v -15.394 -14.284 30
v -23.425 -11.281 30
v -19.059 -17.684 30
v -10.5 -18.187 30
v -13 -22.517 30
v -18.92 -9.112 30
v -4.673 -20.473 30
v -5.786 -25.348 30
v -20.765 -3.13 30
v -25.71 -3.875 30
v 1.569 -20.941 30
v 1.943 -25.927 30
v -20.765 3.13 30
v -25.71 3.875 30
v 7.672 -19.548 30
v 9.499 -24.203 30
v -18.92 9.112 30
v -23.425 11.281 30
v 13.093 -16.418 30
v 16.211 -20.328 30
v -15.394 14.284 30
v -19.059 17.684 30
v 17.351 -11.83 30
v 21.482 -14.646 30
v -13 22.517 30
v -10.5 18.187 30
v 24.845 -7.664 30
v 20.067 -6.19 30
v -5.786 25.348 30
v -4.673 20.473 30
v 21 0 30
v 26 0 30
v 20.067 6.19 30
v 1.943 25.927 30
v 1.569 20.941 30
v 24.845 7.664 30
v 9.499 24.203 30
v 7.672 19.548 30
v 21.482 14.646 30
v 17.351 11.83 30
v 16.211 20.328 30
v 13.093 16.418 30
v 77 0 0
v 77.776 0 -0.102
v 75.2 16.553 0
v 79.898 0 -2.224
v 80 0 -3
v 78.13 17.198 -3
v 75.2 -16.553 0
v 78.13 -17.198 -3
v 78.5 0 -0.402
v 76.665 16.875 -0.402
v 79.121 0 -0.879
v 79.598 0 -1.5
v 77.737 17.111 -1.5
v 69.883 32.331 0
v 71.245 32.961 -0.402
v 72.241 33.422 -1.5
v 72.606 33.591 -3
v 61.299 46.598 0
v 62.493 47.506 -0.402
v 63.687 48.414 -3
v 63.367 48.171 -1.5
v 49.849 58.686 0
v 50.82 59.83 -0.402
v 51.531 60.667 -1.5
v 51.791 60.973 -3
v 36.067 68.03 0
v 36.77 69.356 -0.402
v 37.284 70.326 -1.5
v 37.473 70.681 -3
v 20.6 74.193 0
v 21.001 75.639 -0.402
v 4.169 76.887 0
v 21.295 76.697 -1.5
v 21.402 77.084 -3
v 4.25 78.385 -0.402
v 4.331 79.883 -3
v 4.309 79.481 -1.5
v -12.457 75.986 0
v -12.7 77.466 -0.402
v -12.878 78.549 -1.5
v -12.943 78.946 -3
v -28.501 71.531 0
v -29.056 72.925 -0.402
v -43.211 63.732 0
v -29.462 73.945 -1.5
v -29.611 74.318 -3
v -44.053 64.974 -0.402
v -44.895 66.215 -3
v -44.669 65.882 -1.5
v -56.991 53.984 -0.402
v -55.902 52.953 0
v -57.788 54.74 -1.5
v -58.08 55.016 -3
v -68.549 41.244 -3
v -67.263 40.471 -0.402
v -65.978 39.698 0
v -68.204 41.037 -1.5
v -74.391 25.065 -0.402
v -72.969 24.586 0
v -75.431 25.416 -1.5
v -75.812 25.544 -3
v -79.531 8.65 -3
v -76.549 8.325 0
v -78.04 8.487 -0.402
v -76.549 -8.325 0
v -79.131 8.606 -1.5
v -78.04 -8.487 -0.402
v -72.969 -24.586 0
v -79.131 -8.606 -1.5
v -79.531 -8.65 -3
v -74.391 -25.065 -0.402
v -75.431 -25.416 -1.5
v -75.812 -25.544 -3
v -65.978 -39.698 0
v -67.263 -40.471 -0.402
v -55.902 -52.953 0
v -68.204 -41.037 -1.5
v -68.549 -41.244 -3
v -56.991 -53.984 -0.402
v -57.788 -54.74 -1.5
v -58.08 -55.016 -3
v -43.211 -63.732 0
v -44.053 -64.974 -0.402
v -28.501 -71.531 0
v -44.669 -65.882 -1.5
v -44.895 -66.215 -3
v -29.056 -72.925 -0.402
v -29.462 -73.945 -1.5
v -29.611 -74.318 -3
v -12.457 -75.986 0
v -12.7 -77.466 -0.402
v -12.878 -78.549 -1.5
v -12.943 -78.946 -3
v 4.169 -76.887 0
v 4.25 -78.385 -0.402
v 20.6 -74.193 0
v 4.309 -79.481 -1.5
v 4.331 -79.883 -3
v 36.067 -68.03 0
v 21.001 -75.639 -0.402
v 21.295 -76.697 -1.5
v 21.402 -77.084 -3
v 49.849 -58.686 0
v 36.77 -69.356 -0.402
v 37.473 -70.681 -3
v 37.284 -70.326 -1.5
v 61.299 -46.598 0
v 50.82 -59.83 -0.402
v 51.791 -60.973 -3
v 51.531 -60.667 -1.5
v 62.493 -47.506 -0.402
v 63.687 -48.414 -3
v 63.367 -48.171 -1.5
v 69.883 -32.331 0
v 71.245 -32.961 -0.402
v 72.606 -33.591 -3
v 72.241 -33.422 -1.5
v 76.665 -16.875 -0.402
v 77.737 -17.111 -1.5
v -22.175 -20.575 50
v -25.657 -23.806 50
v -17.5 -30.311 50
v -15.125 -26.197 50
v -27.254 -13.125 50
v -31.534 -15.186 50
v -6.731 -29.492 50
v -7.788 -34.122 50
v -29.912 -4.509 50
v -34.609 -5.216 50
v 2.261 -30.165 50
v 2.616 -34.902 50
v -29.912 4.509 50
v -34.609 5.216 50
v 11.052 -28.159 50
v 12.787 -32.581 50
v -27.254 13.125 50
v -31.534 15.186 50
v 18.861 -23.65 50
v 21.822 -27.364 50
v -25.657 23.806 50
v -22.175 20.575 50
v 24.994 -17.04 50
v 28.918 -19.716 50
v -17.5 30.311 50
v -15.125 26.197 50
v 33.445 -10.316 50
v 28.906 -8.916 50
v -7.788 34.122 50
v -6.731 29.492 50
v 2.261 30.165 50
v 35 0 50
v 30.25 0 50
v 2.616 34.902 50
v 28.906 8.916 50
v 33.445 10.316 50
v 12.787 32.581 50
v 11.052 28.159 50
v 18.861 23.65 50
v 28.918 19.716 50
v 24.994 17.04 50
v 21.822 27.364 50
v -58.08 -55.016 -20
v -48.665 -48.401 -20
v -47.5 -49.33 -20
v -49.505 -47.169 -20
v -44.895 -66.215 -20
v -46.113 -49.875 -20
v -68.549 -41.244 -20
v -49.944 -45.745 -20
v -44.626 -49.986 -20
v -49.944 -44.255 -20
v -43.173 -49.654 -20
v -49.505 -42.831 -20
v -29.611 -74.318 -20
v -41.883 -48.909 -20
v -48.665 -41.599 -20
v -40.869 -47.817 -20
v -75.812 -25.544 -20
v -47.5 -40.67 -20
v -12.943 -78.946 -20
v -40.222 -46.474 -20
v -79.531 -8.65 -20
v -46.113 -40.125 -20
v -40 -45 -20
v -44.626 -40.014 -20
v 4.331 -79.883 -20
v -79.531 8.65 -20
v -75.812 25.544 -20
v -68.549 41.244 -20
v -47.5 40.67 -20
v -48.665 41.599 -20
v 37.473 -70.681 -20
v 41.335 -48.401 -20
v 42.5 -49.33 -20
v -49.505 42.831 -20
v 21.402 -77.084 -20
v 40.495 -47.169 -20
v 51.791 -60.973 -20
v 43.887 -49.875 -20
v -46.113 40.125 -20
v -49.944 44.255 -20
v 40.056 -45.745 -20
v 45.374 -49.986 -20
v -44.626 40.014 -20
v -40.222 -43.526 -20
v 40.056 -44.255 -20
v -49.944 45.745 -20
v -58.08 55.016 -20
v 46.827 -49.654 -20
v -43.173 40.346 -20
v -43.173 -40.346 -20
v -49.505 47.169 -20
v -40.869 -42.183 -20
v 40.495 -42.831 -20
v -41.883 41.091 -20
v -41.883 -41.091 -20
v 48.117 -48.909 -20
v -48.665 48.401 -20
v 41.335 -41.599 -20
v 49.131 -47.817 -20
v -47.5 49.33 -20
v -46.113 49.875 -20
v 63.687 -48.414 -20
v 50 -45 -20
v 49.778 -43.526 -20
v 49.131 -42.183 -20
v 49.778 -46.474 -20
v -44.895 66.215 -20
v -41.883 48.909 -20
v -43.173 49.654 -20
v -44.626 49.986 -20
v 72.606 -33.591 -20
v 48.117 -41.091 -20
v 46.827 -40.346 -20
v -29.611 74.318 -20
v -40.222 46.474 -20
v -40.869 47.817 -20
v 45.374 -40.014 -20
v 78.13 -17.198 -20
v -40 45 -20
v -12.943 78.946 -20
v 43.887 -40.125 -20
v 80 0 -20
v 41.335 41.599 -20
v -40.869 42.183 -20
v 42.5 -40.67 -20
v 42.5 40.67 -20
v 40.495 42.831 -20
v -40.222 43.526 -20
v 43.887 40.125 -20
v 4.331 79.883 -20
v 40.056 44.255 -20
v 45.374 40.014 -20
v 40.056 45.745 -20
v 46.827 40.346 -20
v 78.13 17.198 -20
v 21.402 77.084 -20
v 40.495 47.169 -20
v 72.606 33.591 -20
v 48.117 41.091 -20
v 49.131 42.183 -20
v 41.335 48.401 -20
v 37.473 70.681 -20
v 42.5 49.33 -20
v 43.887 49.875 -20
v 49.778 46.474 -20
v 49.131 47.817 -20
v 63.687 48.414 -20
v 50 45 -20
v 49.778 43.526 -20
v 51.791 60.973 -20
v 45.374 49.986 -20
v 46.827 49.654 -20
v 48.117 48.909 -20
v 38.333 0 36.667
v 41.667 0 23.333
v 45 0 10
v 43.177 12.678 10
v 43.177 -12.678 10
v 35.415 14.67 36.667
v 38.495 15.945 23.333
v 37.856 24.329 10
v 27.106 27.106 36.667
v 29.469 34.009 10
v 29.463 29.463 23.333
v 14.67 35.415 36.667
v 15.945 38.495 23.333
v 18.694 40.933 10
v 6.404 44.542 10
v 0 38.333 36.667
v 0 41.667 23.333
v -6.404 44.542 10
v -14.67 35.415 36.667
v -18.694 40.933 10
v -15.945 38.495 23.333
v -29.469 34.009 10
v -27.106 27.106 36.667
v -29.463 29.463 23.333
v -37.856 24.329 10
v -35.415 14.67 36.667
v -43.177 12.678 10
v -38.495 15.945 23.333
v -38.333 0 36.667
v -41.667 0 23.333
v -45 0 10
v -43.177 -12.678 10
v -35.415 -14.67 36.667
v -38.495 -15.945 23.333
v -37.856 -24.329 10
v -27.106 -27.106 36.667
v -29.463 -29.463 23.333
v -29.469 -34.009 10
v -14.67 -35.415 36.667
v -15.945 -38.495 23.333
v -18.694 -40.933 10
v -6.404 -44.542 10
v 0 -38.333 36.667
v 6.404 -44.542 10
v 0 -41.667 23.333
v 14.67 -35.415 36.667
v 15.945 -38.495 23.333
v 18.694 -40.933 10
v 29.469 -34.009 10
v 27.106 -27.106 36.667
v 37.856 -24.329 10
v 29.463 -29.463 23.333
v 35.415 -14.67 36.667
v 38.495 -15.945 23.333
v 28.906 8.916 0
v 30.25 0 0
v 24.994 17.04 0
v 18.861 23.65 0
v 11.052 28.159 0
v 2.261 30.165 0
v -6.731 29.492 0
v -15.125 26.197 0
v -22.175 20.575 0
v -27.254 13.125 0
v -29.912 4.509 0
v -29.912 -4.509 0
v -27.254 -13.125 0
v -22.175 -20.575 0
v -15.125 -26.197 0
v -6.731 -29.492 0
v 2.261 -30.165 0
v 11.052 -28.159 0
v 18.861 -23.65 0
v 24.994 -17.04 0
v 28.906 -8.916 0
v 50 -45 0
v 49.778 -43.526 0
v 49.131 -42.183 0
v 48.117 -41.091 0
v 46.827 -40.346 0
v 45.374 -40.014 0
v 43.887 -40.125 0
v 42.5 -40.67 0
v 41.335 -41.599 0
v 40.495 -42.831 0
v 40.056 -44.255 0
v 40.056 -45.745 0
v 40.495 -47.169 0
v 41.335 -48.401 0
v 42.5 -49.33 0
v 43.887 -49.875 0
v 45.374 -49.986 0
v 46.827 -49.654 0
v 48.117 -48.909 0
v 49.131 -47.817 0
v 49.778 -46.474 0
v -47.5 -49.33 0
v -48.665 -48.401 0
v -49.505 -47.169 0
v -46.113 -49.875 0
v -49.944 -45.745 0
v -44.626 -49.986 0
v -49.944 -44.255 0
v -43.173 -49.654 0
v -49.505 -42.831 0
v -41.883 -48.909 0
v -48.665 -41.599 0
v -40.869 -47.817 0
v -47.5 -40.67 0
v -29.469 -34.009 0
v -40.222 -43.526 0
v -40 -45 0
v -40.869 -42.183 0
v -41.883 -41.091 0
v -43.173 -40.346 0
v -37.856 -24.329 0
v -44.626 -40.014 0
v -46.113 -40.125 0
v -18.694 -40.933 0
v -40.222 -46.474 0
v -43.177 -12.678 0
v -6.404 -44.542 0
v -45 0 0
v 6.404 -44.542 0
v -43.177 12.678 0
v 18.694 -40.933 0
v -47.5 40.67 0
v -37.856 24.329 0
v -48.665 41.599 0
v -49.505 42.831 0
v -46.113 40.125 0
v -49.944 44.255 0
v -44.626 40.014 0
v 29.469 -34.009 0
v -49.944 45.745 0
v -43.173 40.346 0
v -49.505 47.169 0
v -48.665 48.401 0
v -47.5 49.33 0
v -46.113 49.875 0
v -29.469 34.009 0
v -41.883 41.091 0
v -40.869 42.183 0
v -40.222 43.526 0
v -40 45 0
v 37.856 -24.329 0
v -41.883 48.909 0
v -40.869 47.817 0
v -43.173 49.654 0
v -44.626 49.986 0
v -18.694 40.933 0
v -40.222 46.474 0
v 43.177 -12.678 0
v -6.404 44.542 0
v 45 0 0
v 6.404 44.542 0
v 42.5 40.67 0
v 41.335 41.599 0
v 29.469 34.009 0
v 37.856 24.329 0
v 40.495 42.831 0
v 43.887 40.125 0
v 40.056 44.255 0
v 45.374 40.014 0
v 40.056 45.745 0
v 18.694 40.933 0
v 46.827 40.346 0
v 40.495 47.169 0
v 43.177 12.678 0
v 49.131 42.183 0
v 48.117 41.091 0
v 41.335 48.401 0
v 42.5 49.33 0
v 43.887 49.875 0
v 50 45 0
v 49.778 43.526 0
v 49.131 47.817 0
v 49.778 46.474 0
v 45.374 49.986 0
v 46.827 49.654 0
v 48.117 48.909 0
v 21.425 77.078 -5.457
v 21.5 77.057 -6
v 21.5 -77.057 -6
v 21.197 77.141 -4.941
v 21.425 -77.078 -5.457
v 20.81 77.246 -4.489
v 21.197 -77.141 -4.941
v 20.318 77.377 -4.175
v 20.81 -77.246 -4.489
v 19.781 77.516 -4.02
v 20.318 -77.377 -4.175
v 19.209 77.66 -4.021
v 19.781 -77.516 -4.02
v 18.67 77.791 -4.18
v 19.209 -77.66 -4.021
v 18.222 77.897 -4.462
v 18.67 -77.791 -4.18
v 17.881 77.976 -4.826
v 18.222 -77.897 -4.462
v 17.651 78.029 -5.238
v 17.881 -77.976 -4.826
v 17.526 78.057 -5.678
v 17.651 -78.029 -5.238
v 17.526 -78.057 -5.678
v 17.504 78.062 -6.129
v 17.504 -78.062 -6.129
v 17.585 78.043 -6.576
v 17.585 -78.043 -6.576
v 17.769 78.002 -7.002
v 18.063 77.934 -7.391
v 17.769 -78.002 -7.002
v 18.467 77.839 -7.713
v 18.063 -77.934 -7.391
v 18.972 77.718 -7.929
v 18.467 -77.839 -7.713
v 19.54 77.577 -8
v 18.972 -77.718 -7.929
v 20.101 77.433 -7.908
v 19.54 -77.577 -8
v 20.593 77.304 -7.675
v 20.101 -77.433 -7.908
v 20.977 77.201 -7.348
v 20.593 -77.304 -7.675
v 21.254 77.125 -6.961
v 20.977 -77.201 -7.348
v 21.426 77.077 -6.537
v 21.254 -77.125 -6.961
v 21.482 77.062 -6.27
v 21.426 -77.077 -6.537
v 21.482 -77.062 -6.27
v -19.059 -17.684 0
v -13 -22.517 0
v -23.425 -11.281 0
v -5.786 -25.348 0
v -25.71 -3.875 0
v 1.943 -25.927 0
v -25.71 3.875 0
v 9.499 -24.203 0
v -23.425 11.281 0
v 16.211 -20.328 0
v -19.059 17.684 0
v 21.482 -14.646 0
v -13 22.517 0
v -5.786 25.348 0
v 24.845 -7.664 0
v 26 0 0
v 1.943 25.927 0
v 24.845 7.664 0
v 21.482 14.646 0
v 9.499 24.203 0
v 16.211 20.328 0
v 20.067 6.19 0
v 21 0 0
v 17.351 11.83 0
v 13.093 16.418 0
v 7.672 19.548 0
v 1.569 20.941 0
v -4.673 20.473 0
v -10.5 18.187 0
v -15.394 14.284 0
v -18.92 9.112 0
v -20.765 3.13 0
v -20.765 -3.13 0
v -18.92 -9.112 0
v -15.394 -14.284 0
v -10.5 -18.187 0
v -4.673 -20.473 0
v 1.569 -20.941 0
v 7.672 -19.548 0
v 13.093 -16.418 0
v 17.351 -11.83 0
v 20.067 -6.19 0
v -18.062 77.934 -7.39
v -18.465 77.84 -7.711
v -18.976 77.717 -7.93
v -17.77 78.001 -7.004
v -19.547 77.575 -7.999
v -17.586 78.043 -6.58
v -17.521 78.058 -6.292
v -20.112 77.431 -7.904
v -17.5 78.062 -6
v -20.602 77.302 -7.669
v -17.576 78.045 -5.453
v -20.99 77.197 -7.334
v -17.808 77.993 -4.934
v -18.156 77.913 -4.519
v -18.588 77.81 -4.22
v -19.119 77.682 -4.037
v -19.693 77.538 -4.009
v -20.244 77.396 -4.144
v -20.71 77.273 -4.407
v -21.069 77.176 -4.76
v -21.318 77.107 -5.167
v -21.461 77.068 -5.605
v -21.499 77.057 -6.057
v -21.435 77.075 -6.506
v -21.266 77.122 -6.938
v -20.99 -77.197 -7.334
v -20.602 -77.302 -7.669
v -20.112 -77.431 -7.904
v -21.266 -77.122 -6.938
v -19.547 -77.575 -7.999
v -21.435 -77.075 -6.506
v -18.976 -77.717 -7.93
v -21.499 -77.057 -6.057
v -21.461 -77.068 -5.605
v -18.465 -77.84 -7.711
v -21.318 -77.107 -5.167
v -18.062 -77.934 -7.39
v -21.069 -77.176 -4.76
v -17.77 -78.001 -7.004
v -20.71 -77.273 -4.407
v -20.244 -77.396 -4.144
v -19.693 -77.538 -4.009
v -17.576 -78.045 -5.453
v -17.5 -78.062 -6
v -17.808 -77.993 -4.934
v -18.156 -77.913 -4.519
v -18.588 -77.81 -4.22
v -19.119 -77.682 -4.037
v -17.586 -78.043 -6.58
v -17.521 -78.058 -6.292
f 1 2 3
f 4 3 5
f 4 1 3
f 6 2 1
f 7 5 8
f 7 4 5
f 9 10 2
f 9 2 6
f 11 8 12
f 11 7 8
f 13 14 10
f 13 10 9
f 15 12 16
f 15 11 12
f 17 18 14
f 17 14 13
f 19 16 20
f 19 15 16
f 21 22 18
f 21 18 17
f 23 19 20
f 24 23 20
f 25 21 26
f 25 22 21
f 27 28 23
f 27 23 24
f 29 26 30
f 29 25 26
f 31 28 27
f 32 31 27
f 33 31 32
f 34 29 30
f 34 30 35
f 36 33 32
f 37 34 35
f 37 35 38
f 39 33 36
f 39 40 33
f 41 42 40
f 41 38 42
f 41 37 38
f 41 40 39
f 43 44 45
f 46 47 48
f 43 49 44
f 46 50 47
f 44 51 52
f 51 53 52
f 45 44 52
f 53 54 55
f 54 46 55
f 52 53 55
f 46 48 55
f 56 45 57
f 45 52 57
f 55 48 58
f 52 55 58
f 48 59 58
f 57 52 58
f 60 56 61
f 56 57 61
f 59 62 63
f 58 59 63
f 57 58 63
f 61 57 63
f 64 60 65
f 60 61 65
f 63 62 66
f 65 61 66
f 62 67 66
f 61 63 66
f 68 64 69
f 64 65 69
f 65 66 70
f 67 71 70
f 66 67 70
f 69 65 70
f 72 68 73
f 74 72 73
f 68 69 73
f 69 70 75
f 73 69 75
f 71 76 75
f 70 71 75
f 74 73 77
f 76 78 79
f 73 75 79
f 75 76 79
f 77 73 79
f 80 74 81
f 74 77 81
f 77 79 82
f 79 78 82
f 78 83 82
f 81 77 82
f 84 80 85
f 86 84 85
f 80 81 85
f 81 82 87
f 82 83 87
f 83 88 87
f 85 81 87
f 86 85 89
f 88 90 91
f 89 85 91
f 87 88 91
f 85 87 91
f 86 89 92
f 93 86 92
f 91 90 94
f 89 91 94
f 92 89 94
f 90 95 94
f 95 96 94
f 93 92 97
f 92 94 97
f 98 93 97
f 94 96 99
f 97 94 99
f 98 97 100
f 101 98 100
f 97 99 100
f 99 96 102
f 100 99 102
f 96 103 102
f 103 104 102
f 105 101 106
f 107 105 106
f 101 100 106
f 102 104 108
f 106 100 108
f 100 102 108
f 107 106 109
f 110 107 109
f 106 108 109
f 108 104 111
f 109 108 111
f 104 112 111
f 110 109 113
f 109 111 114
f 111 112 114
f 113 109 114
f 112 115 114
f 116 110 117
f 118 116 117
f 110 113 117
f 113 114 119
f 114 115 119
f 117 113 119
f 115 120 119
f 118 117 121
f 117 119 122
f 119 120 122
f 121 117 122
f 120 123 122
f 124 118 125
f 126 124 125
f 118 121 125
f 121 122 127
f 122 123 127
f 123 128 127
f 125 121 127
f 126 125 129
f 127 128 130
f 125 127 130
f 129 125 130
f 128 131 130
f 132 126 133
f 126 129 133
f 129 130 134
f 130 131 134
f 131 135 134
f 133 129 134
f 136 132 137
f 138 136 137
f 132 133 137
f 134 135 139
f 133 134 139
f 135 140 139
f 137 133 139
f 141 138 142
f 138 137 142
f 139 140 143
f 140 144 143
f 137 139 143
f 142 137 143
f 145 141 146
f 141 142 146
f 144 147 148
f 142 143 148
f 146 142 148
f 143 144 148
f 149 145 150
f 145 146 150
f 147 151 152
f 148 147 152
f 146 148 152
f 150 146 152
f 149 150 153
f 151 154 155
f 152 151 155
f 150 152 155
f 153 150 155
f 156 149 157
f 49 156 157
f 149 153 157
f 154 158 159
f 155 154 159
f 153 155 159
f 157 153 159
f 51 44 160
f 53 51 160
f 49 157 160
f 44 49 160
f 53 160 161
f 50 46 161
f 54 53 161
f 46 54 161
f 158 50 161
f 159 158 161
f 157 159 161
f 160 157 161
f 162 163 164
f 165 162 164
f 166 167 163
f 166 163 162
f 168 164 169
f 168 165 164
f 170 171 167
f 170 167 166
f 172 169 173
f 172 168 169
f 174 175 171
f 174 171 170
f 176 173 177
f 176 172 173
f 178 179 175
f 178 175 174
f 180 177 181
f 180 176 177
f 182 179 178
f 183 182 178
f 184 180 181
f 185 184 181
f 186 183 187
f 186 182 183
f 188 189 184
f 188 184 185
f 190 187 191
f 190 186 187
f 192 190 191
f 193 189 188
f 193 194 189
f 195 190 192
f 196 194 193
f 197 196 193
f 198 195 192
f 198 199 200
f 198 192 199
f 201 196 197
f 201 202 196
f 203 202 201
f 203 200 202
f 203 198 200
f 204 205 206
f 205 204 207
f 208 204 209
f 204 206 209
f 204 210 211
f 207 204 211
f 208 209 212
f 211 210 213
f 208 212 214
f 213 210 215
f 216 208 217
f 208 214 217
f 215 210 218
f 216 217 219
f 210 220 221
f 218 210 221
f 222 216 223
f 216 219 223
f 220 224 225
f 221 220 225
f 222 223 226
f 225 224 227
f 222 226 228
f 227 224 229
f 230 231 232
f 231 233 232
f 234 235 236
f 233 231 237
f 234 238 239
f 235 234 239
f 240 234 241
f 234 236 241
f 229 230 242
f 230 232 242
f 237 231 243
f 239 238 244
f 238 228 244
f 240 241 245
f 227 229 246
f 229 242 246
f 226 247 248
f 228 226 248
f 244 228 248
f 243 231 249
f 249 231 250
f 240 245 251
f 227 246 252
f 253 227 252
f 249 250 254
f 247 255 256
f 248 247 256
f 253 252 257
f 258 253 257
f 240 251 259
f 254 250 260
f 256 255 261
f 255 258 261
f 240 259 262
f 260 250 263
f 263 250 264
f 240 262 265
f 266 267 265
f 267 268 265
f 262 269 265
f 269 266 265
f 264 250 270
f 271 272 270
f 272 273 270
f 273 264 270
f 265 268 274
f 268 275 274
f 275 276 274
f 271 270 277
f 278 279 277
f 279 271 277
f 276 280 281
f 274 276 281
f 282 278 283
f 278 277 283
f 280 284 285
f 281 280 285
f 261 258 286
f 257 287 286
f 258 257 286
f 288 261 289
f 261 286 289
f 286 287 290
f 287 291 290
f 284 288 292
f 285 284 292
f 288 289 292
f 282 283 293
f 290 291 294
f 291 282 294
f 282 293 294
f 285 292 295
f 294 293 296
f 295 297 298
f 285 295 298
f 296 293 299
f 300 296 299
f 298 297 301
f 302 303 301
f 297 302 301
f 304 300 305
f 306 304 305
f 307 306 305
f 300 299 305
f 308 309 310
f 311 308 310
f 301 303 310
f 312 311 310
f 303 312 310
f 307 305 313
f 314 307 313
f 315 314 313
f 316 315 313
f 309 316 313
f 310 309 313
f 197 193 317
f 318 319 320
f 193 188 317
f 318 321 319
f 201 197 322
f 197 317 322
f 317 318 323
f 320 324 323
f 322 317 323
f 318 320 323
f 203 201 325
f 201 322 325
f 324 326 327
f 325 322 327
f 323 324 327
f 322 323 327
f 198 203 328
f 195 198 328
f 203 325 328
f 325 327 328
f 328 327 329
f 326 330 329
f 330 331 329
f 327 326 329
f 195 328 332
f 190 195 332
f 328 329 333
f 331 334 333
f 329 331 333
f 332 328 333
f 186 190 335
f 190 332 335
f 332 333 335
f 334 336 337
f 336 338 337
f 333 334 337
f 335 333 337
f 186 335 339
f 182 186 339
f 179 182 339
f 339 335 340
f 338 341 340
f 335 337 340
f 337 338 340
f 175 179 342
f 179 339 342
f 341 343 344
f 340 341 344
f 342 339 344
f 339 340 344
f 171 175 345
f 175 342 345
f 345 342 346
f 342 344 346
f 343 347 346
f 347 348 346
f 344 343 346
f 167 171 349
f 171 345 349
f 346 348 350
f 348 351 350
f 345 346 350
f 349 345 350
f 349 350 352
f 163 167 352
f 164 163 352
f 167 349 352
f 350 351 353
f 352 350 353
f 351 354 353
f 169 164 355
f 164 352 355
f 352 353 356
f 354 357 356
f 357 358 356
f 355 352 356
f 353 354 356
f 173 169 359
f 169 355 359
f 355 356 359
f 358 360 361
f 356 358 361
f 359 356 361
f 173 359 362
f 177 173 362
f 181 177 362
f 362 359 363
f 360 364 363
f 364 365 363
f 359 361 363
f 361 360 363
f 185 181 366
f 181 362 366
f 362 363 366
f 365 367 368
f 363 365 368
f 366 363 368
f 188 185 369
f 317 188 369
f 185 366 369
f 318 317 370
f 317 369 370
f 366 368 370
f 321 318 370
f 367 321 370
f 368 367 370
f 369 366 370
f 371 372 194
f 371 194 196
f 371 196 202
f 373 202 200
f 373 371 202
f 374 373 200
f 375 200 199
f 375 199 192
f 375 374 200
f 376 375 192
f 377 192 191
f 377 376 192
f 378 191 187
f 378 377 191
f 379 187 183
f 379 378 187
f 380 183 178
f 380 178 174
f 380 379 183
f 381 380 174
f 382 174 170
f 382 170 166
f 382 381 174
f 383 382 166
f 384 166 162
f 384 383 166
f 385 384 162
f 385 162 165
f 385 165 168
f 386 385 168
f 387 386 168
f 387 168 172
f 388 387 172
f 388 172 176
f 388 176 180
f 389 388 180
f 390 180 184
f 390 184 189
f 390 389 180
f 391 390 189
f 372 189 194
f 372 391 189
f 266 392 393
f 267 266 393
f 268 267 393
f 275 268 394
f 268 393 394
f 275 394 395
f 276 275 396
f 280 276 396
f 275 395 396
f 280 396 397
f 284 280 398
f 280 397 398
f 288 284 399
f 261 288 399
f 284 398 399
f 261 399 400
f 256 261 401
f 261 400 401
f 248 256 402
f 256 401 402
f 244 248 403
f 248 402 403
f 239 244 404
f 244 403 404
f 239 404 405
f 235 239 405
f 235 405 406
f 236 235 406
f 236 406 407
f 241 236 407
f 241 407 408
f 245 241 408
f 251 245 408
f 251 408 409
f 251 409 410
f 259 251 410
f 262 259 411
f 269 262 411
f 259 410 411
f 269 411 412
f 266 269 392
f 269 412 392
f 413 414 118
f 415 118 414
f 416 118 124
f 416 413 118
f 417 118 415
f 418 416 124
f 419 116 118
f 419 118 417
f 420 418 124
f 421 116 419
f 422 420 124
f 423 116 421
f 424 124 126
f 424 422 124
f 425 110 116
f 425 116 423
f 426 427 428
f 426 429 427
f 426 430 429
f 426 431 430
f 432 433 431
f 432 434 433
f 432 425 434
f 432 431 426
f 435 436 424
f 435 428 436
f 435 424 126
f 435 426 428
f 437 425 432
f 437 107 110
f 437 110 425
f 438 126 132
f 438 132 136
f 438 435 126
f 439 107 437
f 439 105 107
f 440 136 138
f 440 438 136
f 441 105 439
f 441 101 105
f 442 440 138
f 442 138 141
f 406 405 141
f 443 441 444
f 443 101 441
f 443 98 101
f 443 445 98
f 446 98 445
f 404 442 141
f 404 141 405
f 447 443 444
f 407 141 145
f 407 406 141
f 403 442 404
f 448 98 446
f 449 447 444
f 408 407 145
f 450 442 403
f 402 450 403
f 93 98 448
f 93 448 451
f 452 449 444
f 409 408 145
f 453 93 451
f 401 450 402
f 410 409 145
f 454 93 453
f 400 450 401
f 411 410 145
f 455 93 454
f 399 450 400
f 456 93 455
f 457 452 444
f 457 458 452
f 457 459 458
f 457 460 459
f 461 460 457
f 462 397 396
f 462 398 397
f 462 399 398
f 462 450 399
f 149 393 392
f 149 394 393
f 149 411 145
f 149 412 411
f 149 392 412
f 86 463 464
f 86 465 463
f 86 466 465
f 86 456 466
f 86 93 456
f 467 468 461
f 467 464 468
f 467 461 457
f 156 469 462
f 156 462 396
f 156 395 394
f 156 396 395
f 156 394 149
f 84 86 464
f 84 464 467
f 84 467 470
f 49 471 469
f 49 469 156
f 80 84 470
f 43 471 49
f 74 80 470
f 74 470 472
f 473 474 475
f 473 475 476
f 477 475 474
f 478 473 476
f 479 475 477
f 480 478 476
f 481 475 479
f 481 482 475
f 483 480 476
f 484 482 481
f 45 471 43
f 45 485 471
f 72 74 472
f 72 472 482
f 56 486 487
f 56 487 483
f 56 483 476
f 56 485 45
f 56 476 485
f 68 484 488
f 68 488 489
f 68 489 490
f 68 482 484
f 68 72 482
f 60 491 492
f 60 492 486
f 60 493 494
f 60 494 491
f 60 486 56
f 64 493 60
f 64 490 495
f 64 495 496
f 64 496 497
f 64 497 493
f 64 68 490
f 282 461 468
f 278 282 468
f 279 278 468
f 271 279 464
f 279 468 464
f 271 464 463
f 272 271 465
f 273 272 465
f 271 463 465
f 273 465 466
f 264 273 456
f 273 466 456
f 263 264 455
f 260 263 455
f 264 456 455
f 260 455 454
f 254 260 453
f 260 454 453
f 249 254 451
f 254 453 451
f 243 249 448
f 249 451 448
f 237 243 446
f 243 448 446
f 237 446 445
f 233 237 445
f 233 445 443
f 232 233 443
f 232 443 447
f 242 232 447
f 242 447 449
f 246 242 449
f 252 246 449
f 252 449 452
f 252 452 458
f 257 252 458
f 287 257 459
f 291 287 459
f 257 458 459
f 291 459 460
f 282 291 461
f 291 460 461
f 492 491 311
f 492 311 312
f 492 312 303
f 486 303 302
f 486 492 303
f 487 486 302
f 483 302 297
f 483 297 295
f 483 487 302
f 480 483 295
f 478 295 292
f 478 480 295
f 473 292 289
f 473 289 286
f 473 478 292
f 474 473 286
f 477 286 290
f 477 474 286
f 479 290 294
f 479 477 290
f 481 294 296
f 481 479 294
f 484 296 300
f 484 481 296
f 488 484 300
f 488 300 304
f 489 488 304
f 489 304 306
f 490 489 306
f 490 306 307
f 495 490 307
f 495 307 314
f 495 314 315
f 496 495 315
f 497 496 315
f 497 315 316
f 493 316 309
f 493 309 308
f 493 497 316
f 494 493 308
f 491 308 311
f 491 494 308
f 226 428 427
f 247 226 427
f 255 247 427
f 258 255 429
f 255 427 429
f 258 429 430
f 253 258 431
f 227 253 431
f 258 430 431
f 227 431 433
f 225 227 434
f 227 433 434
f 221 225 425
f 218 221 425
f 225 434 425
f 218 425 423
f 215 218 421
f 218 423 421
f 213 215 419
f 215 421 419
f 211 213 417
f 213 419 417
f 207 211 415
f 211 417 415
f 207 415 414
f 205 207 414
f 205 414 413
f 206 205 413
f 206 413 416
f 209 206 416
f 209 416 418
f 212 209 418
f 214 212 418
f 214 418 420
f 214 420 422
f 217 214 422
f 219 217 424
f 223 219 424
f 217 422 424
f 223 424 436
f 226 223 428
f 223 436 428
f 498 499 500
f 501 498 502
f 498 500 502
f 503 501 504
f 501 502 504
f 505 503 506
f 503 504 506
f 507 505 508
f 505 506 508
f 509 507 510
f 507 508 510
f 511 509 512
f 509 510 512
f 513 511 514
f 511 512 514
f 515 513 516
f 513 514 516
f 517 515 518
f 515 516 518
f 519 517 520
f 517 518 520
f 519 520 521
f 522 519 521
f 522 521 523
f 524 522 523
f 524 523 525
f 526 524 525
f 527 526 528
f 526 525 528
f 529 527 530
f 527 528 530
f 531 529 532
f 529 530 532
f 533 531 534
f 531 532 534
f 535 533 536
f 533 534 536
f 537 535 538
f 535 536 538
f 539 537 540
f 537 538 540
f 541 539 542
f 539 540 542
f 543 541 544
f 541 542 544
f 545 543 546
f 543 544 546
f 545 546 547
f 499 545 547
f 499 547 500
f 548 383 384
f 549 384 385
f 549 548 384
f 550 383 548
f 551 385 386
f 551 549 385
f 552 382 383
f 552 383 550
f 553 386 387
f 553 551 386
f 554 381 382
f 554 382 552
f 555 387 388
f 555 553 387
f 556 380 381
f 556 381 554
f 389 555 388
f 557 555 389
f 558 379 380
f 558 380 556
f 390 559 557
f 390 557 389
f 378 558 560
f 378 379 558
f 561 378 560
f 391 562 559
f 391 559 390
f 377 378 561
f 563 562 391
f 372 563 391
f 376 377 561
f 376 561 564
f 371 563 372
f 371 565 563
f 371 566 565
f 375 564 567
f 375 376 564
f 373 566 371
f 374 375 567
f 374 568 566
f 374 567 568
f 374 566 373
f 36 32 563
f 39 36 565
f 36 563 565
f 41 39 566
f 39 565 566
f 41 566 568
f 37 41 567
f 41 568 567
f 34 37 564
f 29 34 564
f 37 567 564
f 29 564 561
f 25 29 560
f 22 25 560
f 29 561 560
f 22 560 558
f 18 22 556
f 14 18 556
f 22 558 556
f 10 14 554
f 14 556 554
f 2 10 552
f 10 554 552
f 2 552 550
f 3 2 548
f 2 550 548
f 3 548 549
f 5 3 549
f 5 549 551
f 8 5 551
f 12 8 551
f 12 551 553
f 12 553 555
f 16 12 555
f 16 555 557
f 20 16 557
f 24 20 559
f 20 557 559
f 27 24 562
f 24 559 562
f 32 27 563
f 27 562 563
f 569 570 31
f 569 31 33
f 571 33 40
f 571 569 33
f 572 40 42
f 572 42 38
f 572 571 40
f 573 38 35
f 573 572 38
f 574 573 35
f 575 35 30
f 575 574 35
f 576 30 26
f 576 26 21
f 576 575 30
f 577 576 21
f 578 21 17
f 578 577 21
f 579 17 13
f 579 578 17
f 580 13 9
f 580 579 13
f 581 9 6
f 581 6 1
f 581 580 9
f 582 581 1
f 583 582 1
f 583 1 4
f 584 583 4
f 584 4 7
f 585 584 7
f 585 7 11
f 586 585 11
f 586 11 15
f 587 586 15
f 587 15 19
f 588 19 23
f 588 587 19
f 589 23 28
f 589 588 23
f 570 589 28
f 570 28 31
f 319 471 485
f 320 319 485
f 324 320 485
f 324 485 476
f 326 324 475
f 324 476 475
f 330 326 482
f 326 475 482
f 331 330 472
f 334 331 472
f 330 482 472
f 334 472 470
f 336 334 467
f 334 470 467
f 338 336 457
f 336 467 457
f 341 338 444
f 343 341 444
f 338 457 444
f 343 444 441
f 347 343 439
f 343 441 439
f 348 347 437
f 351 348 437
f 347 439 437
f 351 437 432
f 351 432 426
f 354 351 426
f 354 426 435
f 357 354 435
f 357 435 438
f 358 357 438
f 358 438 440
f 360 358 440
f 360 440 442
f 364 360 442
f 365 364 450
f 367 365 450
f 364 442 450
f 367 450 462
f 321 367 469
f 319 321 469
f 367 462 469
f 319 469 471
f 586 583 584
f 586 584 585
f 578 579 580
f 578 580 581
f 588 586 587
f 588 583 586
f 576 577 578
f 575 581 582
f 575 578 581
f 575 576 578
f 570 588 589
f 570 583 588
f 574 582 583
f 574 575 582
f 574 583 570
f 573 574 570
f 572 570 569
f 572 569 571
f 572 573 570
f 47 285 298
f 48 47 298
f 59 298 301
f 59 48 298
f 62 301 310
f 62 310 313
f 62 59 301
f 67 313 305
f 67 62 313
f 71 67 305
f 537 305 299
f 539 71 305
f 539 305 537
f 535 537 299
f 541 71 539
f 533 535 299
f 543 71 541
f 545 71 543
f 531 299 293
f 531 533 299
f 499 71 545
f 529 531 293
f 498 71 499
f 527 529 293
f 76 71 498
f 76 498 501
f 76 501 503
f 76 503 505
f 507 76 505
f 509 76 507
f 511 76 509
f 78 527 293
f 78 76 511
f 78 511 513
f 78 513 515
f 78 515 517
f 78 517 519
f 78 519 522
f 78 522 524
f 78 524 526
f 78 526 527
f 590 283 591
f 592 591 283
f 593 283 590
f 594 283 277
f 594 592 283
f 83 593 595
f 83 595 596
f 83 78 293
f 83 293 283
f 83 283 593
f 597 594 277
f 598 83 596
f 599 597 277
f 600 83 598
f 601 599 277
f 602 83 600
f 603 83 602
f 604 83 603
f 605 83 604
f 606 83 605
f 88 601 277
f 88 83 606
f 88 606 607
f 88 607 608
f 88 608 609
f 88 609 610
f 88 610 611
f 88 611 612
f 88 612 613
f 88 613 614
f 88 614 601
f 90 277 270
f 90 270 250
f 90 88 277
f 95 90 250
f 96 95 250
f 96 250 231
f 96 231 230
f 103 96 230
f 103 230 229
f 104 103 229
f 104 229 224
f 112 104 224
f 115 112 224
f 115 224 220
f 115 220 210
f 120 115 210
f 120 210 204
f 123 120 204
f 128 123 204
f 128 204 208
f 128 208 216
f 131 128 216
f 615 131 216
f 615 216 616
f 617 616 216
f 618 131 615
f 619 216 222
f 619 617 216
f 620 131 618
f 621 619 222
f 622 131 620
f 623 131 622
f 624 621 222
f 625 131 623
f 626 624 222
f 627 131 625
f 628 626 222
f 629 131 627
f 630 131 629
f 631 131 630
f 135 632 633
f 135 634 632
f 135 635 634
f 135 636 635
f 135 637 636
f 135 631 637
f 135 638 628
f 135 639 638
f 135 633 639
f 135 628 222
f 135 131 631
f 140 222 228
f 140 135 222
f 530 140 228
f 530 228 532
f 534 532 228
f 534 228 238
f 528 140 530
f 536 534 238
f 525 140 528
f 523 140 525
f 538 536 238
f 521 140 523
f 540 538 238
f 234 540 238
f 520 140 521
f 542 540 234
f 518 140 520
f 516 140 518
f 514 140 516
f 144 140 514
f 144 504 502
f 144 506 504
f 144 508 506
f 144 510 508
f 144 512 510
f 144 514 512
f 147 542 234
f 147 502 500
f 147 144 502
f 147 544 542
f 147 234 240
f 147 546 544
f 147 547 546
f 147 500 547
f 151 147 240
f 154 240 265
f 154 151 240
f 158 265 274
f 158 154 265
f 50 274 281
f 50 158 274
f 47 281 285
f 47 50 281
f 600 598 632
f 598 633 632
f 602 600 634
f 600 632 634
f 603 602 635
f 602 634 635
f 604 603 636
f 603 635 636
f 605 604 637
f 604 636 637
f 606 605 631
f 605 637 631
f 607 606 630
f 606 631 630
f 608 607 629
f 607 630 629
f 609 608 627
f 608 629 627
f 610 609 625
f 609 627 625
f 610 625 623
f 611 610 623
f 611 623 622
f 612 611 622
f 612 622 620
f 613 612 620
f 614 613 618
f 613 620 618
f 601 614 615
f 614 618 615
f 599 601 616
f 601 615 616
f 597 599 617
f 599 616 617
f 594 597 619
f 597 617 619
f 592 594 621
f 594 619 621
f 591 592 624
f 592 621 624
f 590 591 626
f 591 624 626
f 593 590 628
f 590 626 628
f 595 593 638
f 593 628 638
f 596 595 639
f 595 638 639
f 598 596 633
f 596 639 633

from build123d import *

# Parameters (mm, degrees)
F0_R     = 45
F0_R_2   = 30.25
F1_DEPTH = 50
F2_R     = 80
F2_R_2   = 5
F3_DEPTH = 20
F4_R     = 26
F4_R_2   = 21
F5_DEPTH = 30
F6_SIZE2 = 40
F6_SIZE  = 10
F7_R     = 2
F8_DEPTH = 85
F9_R     = 3


with BuildPart() as f1:
    # F0 (on Top) → F1 (new body)
    with BuildSketch(Plane.XY):
        Circle(F0_R)
        Circle(F0_R_2, mode=Mode.SUBTRACT)
    extrude(amount=F1_DEPTH)

    # F2 (on Top) → F3 (join)
    with BuildSketch(Plane.XY):
        Circle(F2_R)
        with Locations((-45, -45)):
            Circle(F2_R_2, mode=Mode.SUBTRACT)
        with Locations((45, -45)):
            Circle(F2_R_2, mode=Mode.SUBTRACT)
        with Locations((-45, 45)):
            Circle(F2_R_2, mode=Mode.SUBTRACT)
        with BuildLine():
            ThreePointArc((40, 45), (45, 50), (50, 45))
            ThreePointArc((50, 45), (45, 40), (40, 45))
        make_face(mode=Mode.SUBTRACT)
    extrude(amount=-F3_DEPTH)

    # F4 (on Top) → F5 (join)
    with BuildSketch(Plane.XY):
        Circle(F4_R)
        Circle(F4_R_2, mode=Mode.SUBTRACT)
    extrude(amount=F5_DEPTH)

    # F6
    f6_edges = [f1.edges().sort_by_distance(p)[0] for p in [
        (-45, 0, 50),
    ]]
    f6_side = f1.faces().sort_by_distance((-43.727208, 0, 50))[0]
    chamfer(f6_edges, length=F6_SIZE, length2=F6_SIZE2, reference=f6_side)

    # F7 (on Front) → F8 (cut, symmetric)
    with BuildSketch(Plane.XZ):
        with BuildLine():
            ThreePointArc((17.5, -6), (19.5, -8), (21.5, -6))
            ThreePointArc((21.5, -6), (19.5, -4), (17.5, -6))
        make_face()
        with Locations((-19.5, -6)):
            Circle(F7_R)
    extrude(amount=F8_DEPTH, both=True, mode=Mode.SUBTRACT)

    # F9
    f9_edges = [f1.edges().sort_by_distance(p)[0] for p in [
        (-80, 0, 0),
    ]]
    fillet(f9_edges, radius=F9_R)


solid = f1.part
